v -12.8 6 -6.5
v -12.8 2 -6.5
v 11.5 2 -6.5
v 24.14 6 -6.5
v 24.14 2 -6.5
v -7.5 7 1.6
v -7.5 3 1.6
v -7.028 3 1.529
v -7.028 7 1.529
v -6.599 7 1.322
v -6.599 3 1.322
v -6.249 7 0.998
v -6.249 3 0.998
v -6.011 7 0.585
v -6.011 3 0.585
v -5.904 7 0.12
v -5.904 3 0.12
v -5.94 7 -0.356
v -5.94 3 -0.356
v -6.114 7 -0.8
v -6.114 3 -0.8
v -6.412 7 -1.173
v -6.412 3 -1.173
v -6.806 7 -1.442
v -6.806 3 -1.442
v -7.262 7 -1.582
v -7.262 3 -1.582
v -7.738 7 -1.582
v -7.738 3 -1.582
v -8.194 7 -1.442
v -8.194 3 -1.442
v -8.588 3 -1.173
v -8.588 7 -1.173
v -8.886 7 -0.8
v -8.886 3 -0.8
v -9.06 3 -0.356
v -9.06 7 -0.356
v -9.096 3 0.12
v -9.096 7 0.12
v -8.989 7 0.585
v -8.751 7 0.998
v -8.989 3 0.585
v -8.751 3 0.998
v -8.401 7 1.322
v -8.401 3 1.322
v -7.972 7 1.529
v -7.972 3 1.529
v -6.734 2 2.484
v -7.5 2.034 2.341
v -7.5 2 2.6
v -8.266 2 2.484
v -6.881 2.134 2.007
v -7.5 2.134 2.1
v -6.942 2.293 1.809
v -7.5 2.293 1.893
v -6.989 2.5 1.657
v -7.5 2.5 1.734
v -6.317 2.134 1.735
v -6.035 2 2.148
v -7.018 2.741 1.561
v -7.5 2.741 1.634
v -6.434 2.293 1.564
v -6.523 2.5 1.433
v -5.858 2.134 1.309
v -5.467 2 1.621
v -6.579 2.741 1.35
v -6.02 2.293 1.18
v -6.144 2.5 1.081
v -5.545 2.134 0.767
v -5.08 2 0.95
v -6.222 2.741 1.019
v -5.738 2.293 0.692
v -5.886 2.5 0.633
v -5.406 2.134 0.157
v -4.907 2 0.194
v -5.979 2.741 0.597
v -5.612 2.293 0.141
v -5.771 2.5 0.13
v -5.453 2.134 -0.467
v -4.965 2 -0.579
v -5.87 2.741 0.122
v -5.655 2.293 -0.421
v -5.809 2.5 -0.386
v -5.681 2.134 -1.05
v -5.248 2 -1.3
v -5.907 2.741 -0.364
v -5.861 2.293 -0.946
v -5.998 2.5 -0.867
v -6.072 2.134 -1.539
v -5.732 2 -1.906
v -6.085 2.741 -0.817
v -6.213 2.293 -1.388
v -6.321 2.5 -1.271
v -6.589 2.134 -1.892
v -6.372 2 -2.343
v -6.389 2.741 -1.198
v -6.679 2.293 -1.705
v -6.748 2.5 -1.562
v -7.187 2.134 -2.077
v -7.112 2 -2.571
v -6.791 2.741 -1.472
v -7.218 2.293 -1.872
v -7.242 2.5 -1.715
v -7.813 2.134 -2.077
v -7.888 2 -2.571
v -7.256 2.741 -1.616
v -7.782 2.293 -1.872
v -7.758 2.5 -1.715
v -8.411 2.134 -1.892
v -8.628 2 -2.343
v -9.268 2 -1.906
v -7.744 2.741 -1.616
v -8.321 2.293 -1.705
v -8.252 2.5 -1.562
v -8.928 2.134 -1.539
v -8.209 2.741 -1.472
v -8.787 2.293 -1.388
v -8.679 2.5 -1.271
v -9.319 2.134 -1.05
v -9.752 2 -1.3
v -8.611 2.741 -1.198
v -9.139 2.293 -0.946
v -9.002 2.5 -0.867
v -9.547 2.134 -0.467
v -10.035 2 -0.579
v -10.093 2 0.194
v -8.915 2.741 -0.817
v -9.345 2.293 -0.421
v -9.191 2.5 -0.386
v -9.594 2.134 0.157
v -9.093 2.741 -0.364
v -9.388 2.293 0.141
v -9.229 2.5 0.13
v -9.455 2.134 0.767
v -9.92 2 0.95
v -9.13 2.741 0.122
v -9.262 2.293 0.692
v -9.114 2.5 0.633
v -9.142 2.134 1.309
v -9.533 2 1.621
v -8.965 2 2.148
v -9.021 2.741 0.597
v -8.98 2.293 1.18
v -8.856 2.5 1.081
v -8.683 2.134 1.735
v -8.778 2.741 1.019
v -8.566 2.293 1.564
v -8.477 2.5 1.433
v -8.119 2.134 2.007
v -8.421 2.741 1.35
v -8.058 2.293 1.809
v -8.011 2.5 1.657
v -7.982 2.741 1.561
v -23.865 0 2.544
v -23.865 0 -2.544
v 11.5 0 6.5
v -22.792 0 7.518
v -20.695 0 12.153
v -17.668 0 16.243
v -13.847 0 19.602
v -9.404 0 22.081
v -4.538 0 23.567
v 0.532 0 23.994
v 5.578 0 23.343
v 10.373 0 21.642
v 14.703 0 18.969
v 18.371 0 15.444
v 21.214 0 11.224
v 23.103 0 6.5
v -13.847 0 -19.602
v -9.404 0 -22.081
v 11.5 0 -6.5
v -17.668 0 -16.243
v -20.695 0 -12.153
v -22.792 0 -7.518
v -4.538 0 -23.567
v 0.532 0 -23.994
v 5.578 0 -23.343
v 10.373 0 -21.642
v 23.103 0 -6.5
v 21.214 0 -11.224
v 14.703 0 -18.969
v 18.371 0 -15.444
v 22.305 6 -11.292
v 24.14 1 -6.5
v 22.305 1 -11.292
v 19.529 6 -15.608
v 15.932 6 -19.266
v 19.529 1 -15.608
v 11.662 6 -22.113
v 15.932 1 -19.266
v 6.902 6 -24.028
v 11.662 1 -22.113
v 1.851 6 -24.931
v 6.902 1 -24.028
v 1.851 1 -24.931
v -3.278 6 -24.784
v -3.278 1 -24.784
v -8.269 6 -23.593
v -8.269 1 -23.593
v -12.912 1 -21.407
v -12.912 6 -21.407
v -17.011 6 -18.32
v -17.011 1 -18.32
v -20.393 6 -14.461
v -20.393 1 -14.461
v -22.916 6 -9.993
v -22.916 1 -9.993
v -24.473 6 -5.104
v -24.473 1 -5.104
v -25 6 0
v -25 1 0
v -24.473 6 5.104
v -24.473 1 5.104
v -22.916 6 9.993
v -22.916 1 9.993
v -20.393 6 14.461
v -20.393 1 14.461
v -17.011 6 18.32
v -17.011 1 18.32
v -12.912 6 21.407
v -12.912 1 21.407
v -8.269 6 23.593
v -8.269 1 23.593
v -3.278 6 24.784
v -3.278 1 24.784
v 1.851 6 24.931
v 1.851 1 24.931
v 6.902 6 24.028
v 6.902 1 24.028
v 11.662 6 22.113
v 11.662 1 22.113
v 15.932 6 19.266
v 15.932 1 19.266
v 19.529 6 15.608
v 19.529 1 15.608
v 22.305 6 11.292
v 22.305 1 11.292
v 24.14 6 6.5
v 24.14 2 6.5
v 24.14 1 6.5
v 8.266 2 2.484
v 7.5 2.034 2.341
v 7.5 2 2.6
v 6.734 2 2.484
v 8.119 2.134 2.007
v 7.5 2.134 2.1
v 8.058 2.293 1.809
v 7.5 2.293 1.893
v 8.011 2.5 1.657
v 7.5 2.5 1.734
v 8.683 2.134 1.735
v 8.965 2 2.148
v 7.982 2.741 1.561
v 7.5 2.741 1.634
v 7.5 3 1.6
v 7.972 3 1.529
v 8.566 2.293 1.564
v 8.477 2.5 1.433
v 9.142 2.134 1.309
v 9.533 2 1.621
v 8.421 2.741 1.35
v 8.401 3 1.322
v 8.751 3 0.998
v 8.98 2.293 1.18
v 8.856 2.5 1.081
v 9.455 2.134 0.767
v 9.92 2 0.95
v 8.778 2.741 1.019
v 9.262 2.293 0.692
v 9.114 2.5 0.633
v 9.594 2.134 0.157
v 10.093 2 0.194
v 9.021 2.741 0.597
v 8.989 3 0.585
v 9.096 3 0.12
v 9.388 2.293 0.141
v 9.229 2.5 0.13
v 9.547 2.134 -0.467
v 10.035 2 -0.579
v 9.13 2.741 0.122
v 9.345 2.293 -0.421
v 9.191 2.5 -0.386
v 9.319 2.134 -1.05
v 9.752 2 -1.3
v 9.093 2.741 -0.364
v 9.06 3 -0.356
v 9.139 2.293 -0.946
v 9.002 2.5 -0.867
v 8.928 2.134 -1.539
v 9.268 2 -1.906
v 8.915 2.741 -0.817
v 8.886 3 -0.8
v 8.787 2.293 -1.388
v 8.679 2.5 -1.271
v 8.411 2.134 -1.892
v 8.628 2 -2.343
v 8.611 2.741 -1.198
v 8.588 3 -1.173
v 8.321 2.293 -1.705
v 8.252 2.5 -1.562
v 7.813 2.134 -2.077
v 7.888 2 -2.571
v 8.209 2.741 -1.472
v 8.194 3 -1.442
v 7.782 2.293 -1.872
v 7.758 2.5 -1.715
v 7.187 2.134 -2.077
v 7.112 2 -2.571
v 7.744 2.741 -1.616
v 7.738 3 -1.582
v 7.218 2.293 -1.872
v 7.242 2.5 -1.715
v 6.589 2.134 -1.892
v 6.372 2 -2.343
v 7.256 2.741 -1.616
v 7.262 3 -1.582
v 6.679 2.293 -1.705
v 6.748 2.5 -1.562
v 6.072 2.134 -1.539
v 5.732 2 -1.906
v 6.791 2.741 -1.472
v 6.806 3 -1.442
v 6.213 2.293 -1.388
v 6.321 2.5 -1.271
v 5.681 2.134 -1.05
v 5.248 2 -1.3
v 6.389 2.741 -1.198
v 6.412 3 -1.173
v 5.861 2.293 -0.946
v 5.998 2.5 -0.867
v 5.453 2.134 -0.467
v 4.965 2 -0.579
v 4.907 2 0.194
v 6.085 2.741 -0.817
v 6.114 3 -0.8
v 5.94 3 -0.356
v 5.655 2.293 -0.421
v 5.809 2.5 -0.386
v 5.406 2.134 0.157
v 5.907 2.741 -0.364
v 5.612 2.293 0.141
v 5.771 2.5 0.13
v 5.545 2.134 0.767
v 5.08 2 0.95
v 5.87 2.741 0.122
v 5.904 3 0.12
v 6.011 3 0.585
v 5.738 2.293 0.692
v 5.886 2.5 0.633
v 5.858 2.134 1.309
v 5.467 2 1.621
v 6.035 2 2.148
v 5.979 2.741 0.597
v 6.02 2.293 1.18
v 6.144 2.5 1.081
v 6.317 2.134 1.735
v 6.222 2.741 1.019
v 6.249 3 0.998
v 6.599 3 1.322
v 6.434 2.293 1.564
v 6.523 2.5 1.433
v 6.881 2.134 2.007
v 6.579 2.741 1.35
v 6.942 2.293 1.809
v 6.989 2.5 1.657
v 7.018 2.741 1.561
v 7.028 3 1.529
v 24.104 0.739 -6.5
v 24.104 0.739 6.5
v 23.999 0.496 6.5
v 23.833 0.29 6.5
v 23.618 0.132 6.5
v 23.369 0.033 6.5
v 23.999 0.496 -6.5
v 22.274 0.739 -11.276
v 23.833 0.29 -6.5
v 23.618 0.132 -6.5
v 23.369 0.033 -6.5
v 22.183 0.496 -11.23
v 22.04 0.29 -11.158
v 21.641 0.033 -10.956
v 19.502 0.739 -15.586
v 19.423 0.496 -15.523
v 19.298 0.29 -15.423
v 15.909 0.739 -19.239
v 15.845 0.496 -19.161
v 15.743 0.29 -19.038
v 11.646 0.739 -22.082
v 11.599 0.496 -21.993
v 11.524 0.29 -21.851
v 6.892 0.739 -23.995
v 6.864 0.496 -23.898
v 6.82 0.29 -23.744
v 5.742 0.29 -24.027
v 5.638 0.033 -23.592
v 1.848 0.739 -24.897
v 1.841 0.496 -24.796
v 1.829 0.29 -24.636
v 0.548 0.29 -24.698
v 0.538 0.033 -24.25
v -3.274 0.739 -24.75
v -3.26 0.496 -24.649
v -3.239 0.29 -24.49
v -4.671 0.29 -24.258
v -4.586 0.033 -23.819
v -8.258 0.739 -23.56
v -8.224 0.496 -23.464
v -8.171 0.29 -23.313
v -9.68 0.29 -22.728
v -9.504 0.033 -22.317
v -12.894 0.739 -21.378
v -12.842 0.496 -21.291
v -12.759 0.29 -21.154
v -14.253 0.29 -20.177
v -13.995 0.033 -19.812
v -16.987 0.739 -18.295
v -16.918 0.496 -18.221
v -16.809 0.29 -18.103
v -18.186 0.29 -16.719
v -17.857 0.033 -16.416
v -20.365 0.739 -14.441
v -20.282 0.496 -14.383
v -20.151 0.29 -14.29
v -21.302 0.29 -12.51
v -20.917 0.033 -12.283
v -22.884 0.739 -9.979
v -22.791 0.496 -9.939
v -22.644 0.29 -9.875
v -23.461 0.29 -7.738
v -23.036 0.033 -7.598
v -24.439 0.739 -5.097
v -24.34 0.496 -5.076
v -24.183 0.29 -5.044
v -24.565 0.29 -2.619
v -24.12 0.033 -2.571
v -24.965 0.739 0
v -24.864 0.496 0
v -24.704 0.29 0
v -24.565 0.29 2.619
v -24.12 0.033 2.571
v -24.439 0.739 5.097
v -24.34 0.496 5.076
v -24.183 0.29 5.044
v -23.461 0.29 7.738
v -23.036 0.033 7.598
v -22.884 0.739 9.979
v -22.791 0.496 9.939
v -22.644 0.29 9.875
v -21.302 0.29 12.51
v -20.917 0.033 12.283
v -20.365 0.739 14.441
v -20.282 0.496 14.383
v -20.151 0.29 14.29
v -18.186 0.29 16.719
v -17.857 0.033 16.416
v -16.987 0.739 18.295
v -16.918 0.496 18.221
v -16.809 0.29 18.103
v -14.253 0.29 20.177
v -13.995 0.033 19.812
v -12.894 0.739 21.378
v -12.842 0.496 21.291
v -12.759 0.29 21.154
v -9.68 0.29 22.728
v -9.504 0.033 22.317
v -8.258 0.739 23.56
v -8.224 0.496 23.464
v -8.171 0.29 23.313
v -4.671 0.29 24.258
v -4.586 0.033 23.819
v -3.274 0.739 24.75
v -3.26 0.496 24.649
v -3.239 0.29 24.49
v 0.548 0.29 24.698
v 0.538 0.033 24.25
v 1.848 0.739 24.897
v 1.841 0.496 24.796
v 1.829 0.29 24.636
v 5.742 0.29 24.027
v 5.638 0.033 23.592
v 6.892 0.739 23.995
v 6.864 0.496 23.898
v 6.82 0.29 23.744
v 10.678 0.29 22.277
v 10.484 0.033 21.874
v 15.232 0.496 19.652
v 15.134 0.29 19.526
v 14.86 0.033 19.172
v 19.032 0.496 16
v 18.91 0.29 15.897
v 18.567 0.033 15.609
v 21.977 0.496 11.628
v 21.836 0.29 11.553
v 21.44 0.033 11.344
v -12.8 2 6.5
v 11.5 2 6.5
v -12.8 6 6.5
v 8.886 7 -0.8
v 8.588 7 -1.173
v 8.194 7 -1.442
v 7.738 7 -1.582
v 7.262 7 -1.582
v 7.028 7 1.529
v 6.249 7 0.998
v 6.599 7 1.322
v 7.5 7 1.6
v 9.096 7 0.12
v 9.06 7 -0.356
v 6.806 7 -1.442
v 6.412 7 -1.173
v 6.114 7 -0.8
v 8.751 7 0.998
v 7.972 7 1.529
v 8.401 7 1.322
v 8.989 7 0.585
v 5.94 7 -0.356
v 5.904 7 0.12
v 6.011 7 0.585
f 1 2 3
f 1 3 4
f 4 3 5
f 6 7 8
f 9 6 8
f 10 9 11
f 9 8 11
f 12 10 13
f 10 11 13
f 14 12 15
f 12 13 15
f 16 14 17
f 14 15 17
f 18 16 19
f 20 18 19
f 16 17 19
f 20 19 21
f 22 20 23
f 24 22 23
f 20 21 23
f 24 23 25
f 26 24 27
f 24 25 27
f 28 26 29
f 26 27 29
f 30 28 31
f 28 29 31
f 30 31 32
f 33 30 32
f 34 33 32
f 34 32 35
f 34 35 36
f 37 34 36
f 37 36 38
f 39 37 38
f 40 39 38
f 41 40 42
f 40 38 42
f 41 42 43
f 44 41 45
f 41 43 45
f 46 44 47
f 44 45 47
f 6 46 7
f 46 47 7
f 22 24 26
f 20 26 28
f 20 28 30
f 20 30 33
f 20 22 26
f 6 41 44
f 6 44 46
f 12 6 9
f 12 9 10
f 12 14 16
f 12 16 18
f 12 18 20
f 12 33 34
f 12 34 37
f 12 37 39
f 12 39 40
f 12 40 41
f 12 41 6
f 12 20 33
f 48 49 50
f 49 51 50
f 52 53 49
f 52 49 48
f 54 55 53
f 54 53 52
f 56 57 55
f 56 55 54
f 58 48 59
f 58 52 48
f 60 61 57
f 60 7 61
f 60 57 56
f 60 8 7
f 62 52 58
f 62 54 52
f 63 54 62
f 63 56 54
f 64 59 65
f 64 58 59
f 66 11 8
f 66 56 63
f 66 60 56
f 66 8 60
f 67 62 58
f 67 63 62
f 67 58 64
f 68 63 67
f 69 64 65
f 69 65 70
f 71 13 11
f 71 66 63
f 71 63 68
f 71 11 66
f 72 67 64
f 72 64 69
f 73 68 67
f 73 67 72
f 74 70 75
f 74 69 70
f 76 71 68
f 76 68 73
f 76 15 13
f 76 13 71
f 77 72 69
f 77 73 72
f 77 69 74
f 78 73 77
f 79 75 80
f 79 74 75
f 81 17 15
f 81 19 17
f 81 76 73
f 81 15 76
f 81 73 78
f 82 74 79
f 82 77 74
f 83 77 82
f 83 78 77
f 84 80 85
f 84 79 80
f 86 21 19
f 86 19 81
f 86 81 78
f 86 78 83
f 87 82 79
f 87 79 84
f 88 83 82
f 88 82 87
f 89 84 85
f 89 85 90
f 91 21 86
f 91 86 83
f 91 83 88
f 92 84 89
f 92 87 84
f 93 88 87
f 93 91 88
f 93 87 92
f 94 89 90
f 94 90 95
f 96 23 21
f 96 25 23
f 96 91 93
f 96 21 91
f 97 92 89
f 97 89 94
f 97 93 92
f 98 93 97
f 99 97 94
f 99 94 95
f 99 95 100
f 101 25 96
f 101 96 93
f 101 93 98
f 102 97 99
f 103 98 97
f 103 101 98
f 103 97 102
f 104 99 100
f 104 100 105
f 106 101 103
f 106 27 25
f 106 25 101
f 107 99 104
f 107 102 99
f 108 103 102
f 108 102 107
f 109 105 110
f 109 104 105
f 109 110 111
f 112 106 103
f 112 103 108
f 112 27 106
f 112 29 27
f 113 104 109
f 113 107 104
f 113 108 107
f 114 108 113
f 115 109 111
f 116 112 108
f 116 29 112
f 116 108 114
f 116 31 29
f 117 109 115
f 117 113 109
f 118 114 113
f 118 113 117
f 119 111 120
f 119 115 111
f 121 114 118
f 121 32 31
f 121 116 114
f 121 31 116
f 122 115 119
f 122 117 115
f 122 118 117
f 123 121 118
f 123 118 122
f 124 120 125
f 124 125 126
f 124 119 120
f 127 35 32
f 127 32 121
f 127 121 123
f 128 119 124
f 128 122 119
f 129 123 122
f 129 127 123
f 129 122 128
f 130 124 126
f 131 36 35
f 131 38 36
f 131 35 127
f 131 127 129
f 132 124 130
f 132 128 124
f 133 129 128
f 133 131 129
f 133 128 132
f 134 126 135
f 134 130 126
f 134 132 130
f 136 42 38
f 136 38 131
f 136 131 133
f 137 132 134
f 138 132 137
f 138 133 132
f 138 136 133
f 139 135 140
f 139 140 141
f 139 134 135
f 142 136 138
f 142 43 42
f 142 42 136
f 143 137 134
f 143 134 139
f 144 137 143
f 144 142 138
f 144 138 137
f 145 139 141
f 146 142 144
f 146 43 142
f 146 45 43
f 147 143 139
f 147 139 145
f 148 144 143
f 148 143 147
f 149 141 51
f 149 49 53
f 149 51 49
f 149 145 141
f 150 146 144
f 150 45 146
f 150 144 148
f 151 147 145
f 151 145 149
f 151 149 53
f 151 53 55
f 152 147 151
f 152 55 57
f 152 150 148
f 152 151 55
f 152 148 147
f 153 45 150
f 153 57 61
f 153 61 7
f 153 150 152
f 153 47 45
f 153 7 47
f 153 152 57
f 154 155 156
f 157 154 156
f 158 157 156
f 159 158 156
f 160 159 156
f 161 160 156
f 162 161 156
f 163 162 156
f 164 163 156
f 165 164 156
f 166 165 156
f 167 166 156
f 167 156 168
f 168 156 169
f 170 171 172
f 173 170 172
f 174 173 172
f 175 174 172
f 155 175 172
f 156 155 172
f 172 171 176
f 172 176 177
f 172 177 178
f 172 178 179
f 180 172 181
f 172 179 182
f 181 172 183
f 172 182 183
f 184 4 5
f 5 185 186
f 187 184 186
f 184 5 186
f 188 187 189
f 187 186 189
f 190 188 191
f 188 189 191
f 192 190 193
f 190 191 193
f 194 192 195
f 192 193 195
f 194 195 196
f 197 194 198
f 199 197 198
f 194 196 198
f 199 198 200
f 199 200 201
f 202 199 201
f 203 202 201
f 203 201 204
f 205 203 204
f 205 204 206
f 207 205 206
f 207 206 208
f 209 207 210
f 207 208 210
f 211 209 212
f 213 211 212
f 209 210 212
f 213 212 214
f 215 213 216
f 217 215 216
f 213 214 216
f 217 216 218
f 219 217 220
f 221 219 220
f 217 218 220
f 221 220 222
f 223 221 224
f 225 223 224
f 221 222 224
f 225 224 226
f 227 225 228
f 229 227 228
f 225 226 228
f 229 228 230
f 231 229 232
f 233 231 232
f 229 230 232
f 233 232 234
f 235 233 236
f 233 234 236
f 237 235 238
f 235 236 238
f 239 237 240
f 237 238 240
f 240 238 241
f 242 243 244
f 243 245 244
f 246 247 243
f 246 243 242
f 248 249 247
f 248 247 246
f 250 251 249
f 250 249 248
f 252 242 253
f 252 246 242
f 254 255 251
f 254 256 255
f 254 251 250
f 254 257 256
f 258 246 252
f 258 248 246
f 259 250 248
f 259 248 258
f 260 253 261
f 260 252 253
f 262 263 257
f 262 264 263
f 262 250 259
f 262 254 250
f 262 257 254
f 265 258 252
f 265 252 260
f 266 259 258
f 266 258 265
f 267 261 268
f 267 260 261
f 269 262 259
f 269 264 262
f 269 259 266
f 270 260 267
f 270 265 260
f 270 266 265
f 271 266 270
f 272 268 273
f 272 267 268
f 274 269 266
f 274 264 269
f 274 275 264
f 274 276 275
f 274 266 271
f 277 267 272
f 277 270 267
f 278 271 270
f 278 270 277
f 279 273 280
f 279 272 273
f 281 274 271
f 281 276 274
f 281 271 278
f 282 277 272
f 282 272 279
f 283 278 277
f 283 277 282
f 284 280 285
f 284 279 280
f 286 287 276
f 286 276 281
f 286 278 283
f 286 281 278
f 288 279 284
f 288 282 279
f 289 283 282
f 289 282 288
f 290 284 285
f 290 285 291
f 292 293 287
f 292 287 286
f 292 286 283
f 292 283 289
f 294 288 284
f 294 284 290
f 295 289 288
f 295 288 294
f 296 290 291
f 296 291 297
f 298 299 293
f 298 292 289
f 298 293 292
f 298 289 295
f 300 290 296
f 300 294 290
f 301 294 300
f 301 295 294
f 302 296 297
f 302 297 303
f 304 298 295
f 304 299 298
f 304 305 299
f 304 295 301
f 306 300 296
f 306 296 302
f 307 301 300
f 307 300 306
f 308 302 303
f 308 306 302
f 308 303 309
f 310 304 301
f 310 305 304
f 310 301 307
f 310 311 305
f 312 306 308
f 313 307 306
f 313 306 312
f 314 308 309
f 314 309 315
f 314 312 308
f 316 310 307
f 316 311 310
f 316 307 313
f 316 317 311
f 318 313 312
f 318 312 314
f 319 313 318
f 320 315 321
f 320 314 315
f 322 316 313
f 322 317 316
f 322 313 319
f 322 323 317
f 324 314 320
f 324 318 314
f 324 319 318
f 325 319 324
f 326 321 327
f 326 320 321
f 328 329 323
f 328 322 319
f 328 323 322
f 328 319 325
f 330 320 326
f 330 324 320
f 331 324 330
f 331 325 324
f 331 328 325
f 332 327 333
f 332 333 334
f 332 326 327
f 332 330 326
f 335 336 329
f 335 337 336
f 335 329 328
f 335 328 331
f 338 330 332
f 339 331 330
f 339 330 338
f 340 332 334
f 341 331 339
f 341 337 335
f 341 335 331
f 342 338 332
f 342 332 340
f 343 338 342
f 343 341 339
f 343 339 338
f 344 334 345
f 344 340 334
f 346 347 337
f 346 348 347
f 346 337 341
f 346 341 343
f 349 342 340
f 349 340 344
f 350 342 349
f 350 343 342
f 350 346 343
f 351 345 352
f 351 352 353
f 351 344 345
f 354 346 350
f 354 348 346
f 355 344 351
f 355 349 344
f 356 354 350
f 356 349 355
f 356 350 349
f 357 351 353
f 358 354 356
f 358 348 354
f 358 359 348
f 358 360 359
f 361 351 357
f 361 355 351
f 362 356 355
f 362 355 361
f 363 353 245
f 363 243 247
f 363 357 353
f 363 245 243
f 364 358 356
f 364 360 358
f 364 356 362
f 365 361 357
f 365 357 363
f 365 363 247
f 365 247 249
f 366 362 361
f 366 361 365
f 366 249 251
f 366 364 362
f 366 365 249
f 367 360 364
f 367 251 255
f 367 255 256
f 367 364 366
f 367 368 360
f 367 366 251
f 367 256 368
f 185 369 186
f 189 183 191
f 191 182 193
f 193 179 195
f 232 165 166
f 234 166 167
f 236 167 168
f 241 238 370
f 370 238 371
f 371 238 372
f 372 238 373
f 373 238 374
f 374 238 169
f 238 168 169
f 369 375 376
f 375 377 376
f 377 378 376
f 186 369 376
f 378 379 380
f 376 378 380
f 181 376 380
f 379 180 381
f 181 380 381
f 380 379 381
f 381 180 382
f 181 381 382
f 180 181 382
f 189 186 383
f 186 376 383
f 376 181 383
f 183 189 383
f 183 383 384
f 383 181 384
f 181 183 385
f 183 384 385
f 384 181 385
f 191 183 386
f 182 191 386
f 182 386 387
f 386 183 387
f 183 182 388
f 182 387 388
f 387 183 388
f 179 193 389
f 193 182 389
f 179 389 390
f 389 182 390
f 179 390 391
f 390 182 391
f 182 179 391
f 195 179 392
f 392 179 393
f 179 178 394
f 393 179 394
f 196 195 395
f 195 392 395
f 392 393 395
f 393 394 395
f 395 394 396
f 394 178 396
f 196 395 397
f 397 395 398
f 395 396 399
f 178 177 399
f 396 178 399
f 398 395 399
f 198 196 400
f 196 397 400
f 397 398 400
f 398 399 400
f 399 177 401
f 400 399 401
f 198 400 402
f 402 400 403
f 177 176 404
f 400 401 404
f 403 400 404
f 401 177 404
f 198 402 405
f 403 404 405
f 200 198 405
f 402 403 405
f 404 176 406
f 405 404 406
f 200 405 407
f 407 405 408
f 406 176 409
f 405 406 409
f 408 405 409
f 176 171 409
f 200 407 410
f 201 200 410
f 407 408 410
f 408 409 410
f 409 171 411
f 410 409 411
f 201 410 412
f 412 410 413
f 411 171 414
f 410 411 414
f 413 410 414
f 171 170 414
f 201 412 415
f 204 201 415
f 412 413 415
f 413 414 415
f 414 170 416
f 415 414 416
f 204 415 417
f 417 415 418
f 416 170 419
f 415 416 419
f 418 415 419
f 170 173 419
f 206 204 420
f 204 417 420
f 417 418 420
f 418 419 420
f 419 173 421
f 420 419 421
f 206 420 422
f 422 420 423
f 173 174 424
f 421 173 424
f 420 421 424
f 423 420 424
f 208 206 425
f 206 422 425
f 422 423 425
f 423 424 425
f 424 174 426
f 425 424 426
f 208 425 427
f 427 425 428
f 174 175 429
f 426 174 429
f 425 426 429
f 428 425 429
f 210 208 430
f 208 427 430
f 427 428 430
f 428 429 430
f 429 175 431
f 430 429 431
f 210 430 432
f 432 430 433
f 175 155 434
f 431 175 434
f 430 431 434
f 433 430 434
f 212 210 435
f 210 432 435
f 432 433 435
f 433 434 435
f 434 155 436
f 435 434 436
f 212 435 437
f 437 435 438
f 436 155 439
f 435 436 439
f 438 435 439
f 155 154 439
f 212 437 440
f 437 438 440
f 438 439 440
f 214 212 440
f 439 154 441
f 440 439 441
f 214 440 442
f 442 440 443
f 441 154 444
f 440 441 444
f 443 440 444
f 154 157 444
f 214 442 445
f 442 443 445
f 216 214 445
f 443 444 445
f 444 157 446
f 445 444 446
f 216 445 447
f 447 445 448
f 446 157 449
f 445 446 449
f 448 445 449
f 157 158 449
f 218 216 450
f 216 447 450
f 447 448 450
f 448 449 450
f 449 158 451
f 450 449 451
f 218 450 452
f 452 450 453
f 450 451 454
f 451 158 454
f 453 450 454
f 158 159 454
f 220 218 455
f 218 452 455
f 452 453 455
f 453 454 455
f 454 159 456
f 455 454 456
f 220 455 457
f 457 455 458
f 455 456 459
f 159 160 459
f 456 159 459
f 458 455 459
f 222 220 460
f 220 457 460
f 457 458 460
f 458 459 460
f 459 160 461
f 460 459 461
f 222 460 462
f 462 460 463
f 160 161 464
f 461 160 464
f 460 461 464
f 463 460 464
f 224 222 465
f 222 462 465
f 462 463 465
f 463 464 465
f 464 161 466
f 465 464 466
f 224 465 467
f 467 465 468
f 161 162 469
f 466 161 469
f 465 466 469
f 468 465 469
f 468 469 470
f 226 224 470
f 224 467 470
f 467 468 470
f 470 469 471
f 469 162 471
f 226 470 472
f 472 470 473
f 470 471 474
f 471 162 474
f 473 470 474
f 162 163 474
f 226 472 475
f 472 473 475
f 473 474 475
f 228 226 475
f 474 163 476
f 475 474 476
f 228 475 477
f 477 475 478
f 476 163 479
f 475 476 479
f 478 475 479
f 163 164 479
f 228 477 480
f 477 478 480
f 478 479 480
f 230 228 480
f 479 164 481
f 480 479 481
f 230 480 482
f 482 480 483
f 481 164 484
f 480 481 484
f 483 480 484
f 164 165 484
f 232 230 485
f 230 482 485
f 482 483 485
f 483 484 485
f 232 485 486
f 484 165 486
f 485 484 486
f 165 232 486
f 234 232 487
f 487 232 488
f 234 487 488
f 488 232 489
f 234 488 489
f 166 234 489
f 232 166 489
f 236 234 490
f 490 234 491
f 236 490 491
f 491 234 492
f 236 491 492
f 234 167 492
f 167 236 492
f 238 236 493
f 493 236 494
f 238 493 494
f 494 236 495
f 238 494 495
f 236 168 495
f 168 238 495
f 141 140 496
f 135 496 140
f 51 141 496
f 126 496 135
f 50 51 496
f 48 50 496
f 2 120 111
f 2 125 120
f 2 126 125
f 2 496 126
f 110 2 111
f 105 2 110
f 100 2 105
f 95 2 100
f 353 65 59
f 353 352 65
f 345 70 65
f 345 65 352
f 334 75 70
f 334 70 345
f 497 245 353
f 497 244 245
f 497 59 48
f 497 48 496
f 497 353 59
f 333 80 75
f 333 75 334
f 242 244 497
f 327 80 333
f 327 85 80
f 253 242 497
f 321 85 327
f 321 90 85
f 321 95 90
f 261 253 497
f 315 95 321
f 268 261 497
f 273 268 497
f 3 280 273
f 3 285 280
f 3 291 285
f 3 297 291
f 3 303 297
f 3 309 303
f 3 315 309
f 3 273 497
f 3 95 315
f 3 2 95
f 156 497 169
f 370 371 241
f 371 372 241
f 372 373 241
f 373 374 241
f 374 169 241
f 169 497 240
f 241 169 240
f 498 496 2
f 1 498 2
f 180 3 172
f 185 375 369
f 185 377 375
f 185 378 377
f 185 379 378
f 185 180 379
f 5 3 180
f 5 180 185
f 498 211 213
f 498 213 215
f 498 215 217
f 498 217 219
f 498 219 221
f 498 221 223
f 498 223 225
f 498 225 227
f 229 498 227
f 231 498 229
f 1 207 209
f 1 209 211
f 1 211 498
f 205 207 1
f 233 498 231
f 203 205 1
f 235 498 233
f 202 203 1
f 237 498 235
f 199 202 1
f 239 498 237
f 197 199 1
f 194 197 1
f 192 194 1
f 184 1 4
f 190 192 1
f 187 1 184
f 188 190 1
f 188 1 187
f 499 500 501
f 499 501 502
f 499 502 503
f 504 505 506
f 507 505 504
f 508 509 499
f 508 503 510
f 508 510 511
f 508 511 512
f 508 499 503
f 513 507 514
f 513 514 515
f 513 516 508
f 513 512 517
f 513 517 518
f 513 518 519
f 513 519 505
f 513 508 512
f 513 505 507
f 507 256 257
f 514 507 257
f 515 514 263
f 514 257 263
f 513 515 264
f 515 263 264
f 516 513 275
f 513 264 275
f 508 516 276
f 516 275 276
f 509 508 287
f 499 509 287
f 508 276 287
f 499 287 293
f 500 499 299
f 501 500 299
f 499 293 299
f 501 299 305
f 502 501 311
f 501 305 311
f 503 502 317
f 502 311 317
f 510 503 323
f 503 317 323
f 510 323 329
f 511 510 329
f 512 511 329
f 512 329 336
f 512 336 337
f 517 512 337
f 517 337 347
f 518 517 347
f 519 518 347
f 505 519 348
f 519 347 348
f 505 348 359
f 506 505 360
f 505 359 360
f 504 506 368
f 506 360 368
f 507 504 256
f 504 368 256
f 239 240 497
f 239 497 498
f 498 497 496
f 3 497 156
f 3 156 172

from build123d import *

# Parameters (mm, degrees)
SKETCH1_R           = 1.6
BOSS_EXTRUDE1_DEPTH = 2
BOSS_EXTRUDE2_DEPTH = 4
CUT_EXTRUDE1_REACH  = 37.581
SKETCH3_W           = 13.5
SKETCH3_H           = 13
SKETCH4_R           = 1.6
BOSS_EXTRUDE3_DEPTH = 5
FILLET1_R           = 1
FILLET2_R           = 1


with BuildPart() as part:
    # Sketch1 → Boss-Extrude1 (new body)
    # profile 1 of 4: a face of its own
    with BuildSketch(Plane(origin=(0, 0, 0), x_dir=(1, 0, 0), z_dir=(0, 1, 0))):
        with BuildLine():
            Line((-12.8, -6.5), (-12.8, 6.5))
            Line((-12.8, 6.5), (24.140215409, 6.5))
            ThreePointArc((24.140215409, 6.5), (-25, 0), (24.140215409, -6.5))
            Line((24.140215409, -6.5), (-12.8, -6.5))
        make_face()
    # profile 2 of 4: a face of its own
    with BuildSketch(Plane(origin=(0, 0, 0), x_dir=(1, 0, 0), z_dir=(0, 1, 0))):
        with BuildLine():
            Line((24.140215409, 6.5), (-12.8, 6.5))
            Line((-12.8, 6.5), (-12.8, -6.5))
            Line((-12.8, -6.5), (24.140215409, -6.5))
            ThreePointArc((24.140215409, -6.5), (24.784121784, -3.278308617), (25, 0))
            ThreePointArc((25, 0), (24.784121784, 3.278308617), (24.140215409, 6.5))
        make_face()
        with Locations((-7.5, 0)):
            Circle(SKETCH1_R, mode=Mode.SUBTRACT)
        with Locations((7.5, 0)):
            Circle(SKETCH1_R, mode=Mode.SUBTRACT)
    # profile 3 of 4: a face of its own
    with BuildSketch(Plane(origin=(0, 0, 0), x_dir=(1, 0, 0), z_dir=(0, 1, 0))):
        with Locations((-7.5, 0)):
            Circle(SKETCH1_R)
    # profile 4 of 4: a face of its own
    with BuildSketch(Plane(origin=(0, 0, 0), x_dir=(1, 0, 0), z_dir=(0, 1, 0))):
        with Locations((7.5, 0)):
            Circle(SKETCH1_R)
    extrude(amount=BOSS_EXTRUDE1_DEPTH)

    # Sketch2 → Boss-Extrude2 (add)
    with BuildSketch(Plane(origin=(0, 2, 0), x_dir=(1, 0, 0), z_dir=(0, 1, 0))):
        with BuildLine():
            Line((24.140215409, -6.5), (-12.8, -6.5))
            Line((-12.8, -6.5), (-12.8, 6.5))
            Line((-12.8, 6.5), (24.140215409, 6.5))
            ThreePointArc((24.140215409, 6.5), (-25, 0), (24.140215409, -6.5))
        make_face()
    extrude(amount=BOSS_EXTRUDE2_DEPTH)

    # Sketch3 → Cut-Extrude1 (cut, up to next)
    with BuildSketch(Plane(origin=(0, 2, 0), x_dir=(1, 0, 0), z_dir=(0, 1, 0)), mode=Mode.PRIVATE) as cut_extrude1_sk1:
        with Locations((18.25, 0)):
            Rectangle(SKETCH3_W, SKETCH3_H)
    cut_extrude1_tool1 = extrude(cut_extrude1_sk1.sketch, amount=-CUT_EXTRUDE1_REACH, mode=Mode.PRIVATE) & part.part
    add(cut_extrude1_tool1.solids().sort_by_distance((18.25, 2, 0))[0], mode=Mode.SUBTRACT)

    # Sketch4 → Boss-Extrude3 (add)
    with BuildSketch(Plane(origin=(0, 2, 0), x_dir=(1, 0, 0), z_dir=(0, 1, 0))):
        with Locations(Location((7.5, 0, 0), (0, 0, 270))):
            Circle(SKETCH4_R)
        with Locations(Location((-7.5, 0, 0), (0, 0, 270))):
            Circle(SKETCH4_R)
    extrude(amount=BOSS_EXTRUDE3_DEPTH)

    # Fillet1
    fillet1_edges = [part.edges().sort_by_distance(p)[0] for p in [
        (7.5, 2, -1.6),
        (-7.5, 2, -1.6),
    ]]
    fillet(fillet1_edges, radius=FILLET1_R)

    # Fillet2
    fillet2_edges = [part.edges().sort_by_distance(p)[0] for p in [
        (-25, 0, 0),
    ]]
    fillet(fillet2_edges, radius=FILLET2_R)


solid = part.part
